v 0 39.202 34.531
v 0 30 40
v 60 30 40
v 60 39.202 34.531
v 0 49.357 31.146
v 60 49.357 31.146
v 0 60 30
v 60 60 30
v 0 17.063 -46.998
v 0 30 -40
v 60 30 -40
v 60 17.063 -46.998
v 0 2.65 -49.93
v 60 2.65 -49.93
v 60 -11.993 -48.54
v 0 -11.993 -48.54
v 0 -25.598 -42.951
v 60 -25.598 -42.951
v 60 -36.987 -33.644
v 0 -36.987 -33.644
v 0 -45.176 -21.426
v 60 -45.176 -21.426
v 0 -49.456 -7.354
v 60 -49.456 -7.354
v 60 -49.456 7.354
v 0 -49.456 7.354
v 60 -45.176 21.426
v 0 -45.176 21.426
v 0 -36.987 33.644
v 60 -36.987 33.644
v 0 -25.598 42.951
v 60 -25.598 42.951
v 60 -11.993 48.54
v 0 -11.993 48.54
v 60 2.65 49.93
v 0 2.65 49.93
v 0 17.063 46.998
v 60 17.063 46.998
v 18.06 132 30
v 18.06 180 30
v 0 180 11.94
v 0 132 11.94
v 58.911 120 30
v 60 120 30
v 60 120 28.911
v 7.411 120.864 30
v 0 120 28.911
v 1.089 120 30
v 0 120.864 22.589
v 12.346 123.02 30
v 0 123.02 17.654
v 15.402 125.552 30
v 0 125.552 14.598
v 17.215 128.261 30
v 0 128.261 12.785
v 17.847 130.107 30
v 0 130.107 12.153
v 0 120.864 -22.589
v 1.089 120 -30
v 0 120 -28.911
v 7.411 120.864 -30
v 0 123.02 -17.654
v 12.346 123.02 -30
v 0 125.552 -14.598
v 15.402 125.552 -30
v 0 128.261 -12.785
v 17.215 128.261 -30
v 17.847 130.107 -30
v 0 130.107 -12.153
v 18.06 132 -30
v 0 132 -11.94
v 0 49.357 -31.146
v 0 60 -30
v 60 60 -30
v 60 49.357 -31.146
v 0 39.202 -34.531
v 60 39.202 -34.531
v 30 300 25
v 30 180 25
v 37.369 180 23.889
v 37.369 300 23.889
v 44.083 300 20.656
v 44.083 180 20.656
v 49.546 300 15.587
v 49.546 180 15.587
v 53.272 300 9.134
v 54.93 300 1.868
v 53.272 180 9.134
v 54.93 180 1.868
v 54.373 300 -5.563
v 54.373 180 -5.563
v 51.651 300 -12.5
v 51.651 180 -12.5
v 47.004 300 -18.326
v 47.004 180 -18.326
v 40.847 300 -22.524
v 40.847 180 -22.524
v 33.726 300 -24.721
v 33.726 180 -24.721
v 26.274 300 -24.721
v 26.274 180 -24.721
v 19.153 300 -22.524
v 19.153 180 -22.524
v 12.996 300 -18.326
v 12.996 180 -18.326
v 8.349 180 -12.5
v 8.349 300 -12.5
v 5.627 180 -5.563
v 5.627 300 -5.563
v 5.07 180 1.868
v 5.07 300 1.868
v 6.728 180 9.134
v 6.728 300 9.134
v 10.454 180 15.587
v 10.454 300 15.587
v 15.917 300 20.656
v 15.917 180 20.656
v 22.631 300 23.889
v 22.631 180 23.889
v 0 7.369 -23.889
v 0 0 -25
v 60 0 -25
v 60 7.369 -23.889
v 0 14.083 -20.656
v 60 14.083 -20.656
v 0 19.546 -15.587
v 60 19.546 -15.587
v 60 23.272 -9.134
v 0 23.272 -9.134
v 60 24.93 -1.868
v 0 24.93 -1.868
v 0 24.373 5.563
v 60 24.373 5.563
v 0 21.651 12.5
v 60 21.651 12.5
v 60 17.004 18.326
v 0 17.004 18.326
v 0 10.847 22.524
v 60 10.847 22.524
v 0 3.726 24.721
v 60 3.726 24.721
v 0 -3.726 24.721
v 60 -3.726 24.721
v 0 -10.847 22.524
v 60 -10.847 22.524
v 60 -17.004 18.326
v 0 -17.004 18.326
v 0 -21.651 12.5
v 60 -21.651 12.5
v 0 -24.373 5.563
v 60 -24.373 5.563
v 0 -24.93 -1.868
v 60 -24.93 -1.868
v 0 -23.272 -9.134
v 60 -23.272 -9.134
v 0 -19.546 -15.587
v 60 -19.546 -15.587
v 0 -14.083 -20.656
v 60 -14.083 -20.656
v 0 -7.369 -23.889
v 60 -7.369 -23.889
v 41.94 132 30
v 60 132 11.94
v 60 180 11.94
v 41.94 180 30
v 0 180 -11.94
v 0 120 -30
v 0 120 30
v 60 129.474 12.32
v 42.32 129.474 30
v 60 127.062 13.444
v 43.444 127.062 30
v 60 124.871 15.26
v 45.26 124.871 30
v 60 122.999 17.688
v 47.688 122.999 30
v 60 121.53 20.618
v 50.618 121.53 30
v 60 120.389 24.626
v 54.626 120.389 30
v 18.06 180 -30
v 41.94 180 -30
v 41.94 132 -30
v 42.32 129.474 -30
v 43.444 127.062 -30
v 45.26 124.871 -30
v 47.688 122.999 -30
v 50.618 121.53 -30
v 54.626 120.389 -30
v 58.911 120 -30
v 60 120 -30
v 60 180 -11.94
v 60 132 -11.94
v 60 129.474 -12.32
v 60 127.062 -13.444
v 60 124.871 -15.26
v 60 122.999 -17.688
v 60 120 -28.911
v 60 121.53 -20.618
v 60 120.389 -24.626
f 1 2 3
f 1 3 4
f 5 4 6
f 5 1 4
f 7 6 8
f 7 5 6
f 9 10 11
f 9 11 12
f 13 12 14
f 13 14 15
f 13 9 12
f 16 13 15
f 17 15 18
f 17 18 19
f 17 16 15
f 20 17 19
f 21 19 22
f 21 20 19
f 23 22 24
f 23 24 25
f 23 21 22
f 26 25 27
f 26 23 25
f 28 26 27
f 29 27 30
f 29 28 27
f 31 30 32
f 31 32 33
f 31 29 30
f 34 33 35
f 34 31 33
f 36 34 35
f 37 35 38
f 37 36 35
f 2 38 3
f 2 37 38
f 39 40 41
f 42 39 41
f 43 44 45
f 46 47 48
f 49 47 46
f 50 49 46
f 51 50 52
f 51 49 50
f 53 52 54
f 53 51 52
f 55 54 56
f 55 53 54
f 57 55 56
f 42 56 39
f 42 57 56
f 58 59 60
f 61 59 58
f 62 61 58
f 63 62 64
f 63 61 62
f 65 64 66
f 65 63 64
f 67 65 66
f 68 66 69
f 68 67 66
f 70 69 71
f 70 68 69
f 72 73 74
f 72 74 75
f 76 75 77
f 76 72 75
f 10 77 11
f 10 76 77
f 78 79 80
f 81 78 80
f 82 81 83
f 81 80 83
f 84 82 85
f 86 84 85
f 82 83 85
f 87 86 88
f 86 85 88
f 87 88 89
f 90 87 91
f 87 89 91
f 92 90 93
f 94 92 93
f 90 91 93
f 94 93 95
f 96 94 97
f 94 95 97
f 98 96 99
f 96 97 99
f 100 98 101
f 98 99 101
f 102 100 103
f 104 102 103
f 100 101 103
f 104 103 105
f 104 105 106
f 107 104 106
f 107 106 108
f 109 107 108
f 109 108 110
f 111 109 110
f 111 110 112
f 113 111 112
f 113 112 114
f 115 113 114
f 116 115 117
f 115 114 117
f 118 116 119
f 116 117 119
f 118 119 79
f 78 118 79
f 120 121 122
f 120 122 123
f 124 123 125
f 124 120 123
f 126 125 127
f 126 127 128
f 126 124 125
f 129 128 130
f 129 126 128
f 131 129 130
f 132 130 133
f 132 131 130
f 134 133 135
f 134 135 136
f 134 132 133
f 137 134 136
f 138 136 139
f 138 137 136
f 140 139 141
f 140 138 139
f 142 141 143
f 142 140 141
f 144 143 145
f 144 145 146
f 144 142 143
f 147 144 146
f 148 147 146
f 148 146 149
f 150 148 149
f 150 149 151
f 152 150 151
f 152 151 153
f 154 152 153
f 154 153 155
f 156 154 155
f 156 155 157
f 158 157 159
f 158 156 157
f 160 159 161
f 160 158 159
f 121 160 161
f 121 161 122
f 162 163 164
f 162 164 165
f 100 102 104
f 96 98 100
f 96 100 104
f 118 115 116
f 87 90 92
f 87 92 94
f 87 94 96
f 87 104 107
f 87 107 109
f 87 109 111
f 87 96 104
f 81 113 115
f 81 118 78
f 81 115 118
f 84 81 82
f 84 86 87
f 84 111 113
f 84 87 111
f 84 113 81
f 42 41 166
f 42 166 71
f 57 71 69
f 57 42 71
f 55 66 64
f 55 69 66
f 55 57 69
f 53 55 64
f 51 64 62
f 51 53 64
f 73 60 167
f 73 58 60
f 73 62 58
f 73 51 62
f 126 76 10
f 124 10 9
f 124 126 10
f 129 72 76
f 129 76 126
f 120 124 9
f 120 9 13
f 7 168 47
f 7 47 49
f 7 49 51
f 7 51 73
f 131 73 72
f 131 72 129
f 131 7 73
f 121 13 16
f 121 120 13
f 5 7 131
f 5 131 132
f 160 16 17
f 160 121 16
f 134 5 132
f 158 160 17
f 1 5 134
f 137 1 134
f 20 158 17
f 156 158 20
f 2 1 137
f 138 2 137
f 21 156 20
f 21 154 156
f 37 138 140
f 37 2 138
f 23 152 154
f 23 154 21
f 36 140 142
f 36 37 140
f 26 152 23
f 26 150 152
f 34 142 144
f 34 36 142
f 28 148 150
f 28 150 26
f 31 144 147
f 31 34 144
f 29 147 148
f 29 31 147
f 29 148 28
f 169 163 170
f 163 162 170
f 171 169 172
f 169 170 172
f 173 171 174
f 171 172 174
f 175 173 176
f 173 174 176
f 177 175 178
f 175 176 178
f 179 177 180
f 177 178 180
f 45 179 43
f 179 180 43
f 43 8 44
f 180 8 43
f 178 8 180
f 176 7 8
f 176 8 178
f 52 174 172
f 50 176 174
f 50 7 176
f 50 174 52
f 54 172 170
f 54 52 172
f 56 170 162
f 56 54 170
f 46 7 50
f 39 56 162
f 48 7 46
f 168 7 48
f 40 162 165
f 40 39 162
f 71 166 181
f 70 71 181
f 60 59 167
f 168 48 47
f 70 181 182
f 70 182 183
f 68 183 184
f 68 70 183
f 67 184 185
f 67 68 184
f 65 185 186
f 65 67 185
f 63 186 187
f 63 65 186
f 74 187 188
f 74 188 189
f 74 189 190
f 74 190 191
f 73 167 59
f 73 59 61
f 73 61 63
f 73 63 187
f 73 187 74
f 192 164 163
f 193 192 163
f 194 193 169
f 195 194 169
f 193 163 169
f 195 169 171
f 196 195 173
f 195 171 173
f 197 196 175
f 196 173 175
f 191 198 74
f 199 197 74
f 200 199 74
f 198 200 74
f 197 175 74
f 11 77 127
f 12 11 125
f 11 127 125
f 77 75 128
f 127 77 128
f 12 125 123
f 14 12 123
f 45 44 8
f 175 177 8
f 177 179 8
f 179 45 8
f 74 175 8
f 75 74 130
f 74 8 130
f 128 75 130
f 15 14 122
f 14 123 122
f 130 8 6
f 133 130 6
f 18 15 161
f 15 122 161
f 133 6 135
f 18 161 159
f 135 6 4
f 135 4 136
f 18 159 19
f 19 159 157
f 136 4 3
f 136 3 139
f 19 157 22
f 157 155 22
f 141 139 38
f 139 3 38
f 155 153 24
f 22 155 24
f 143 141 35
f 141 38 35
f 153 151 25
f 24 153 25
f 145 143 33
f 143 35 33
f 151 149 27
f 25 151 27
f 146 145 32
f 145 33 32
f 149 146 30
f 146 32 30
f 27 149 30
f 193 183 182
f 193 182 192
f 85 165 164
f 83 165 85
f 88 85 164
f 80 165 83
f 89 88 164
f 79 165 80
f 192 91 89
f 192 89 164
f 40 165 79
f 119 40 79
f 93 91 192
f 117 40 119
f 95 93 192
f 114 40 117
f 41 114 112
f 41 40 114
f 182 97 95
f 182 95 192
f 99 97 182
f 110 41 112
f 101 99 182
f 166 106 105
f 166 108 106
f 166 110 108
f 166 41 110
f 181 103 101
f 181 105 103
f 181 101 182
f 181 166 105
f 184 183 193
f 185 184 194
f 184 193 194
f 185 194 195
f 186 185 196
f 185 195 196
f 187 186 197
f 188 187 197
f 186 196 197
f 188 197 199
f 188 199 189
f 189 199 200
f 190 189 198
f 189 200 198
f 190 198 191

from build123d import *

# Parameters (mm, degrees)
SKETCH1_R           = 25
BOSS_EXTRUDE1_DEPTH = 60
CUT_EXTRUDE3_DEPTH  = 60
SKETCH2_4_R         = 25
BOSS_EXTRUDE2_DEPTH = 120
FILLET1_R           = 12


with BuildPart() as part:
    # Sketch1 → Boss-Extrude1 (new body)
    with BuildSketch(Plane.YZ):
        with BuildLine():
            Line((60, 30), (180, 30))
            Line((180, 30), (180, -30))
            Line((180, -30), (60, -30))
            ThreePointArc((60, -30), (44.188611699, -32.565835097), (30, -40))
            ThreePointArc((30, -40), (-50, 0), (30, 40))
            ThreePointArc((30, 40), (44.188611699, 32.565835097), (60, 30))
        make_face()
        Circle(SKETCH1_R, mode=Mode.SUBTRACT)
    extrude(amount=BOSS_EXTRUDE1_DEPTH)

    # Sketch2 → Cut-Extrude3 (cut)
    with BuildSketch(Plane(origin=(0, 180, 0), x_dir=(-1, 0, 0), z_dir=(0, 1, 0))):
        Polygon((0, 30), (-18.06, 30), (0, 11.94), align=None)
        Polygon((-60, 11.94), (-41.94, 30), (-60, 30), align=None)
        Polygon((0, -30), (0, -11.94), (-18.06, -30), align=None)
        Polygon((-41.94, -30), (-60, -11.94), (-60, -30), align=None)
    extrude(amount=-CUT_EXTRUDE3_DEPTH, mode=Mode.SUBTRACT)

    # Sketch2<4> → Boss-Extrude2 (add)
    with BuildSketch(Plane(origin=(0, 180, 0), x_dir=(-1, 0, 0), z_dir=(0, 1, 0))):
        with Locations((-30, 0)):
            Circle(SKETCH2_4_R)
    extrude(amount=BOSS_EXTRUDE2_DEPTH)

    # Fillet1
    fillet1_edges = [part.edges().sort_by_distance(p)[0] for p in [
        (9.03, 120, -20.97),
        (9.03, 120, 20.97),
        (50.97, 120, -20.97),
        (50.97, 120, 20.97),
    ]]
    fillet(fillet1_edges, radius=FILLET1_R)


solid = part.part
